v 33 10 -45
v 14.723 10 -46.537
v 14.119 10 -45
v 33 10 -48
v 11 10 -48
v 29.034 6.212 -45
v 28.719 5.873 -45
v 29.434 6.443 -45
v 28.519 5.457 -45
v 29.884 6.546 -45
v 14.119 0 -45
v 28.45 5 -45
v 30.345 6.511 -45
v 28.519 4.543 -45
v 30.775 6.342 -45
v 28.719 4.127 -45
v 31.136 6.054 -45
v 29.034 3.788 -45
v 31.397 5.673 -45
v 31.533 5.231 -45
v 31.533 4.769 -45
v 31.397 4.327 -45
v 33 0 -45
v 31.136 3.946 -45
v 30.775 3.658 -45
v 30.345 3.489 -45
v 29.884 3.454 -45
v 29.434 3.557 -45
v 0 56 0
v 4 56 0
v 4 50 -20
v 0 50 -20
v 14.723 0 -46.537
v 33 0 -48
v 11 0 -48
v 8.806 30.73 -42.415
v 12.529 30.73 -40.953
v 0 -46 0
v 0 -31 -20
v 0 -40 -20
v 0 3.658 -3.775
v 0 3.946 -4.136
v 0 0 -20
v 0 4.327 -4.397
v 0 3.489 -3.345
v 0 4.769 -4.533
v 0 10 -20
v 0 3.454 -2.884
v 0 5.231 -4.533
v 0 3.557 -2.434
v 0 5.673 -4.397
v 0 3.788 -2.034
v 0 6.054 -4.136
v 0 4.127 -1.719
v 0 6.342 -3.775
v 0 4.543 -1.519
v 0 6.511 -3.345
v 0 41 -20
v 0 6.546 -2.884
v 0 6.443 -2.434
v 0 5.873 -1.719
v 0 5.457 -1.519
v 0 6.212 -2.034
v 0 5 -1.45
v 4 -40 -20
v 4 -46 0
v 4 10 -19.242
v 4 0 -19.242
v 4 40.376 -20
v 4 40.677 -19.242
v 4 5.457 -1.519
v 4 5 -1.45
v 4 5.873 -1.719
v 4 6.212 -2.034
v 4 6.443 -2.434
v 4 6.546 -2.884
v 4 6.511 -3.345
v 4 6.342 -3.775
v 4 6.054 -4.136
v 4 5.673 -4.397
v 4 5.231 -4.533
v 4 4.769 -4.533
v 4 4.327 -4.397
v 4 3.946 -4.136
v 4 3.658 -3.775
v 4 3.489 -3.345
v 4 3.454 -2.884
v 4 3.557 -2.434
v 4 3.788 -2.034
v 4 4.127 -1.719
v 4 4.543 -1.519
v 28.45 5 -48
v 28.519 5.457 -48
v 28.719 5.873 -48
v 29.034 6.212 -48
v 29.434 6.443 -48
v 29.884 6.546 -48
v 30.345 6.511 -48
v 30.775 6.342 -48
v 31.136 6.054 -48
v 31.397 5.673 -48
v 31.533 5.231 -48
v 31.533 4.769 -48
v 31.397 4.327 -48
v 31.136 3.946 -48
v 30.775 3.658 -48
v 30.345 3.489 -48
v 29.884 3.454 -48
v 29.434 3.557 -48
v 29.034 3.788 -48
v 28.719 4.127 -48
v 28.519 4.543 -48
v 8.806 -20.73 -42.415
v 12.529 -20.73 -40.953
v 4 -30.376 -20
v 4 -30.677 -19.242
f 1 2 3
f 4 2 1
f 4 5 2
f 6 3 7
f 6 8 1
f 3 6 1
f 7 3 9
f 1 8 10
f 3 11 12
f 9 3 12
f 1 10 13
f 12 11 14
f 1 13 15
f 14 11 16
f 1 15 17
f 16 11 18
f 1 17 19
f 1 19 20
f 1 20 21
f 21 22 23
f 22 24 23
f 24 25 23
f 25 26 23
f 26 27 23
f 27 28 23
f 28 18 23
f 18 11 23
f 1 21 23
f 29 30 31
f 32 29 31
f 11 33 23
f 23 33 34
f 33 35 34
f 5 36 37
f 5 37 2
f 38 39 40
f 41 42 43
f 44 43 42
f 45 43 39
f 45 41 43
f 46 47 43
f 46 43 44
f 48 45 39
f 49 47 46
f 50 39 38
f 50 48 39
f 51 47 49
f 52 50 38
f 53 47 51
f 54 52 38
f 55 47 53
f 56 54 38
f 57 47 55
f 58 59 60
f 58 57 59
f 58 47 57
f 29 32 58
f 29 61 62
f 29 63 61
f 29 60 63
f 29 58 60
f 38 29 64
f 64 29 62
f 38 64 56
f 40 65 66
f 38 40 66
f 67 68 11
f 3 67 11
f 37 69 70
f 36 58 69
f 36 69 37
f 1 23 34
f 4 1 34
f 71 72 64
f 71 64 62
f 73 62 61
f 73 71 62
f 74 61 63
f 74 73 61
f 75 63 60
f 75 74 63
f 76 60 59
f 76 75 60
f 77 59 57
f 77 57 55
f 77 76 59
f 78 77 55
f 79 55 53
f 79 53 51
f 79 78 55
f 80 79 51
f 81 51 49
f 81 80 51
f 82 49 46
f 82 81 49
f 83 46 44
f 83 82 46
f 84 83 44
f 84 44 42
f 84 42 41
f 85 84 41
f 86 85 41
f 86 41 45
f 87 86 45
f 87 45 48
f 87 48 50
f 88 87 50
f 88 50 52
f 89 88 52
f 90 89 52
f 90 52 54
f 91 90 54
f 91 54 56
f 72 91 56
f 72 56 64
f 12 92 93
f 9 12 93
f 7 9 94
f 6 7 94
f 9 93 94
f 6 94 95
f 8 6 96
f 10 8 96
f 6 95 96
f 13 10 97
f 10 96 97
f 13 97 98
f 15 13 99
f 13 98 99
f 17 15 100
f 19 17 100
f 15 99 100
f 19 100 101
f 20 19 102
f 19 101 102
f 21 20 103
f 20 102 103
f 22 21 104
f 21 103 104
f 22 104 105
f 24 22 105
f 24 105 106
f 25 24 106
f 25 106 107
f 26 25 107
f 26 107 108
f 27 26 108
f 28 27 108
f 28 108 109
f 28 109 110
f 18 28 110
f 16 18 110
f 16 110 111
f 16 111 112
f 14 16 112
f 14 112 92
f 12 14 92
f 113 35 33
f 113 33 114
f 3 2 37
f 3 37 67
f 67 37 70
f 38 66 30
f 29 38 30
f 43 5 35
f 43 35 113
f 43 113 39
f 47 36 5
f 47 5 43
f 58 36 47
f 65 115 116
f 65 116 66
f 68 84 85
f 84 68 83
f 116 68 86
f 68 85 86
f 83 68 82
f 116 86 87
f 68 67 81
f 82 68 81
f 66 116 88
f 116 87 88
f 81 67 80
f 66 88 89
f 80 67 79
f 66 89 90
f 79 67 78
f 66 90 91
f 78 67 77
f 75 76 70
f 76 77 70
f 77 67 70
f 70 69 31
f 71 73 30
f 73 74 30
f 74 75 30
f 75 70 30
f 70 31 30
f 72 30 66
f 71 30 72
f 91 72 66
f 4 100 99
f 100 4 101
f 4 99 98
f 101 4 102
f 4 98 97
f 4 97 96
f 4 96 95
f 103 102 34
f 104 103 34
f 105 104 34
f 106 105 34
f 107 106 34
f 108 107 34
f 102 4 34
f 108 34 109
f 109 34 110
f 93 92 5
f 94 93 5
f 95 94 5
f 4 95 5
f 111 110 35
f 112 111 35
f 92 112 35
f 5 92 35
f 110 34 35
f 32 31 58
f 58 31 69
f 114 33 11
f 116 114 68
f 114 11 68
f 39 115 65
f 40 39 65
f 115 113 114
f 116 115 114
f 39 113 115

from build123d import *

# Parameters (mm, degrees)
EXTRUDE_1_DEPTH     = 10
SKETCH_2_R          = 1.55
CUT_EXTRUDE_3_DEPTH = 10
CUT_EXTRUDE_4_DEPTH = 10
EXTRUDE_2_DEPTH     = 4
SKETCH_5_R          = 1.55
EXTRUDE_4_DEPTH     = 4


with BuildPart() as part:
    # 草图1 → 凸台-拉伸1 (new body)
    with BuildSketch(Plane(origin=(0, 0, 0), x_dir=(1, 0, 0), z_dir=(0, 1, 0))):
        Polygon((0, 0), (3, 0), (3, 16.697011668), (14.11903113, 45), (33, 45), (33, 48), (11, 48), (0, 20), align=None)
    extrude(amount=EXTRUDE_1_DEPTH)

    # 草图2 → 切除-拉伸3 (cut)
    with BuildSketch(Plane.ZY):
        with Locations((-3, 5)):
            Circle(SKETCH_2_R)
    extrude(amount=-CUT_EXTRUDE_3_DEPTH, mode=Mode.SUBTRACT)

    # 草图3 → 切除-拉伸4 (cut)
    with BuildSketch(Plane(origin=(0, 0, -48), x_dir=(-1, 0, 0), z_dir=(0, 0, -1))):
        with BuildLine():
            ThreePointArc((-31.55, 5), (-30, 3.45), (-28.45, 5))
            ThreePointArc((-28.45, 5), (-30, 6.55), (-31.55, 5))
        make_face()
    extrude(amount=-CUT_EXTRUDE_4_DEPTH, mode=Mode.SUBTRACT)

    # 草图4 → 凸台-拉伸2 (add)
    with BuildSketch(Plane(origin=(-6.806629834, 0, -2.674033149), x_dir=(-0.36565237242299337, 0, 0.9307514934403471), z_dir=(-0.9307514934403471, 0, -0.36565237242299337))):
        Polygon((-18.615029869, 10), (-18.615029869, 41), (-42.698247782, 30.73), (-48.698247782, 10), (-48.698247782, 0), (-42.698247782, -20.73), (-18.615029869, -31), align=None)
    extrude(amount=-EXTRUDE_2_DEPTH)

    # 草图5 → 凸台-拉伸4 (add)
    with BuildSketch(Plane.ZY):
        Polygon((-20, 41), (-20, -31), (-20, -40), (0, -46), (0, 56), (-20, 50), align=None)
        with Locations((-3, 5)):
            Circle(SKETCH_5_R, mode=Mode.SUBTRACT)
    extrude(amount=-EXTRUDE_4_DEPTH)


solid = part.part
